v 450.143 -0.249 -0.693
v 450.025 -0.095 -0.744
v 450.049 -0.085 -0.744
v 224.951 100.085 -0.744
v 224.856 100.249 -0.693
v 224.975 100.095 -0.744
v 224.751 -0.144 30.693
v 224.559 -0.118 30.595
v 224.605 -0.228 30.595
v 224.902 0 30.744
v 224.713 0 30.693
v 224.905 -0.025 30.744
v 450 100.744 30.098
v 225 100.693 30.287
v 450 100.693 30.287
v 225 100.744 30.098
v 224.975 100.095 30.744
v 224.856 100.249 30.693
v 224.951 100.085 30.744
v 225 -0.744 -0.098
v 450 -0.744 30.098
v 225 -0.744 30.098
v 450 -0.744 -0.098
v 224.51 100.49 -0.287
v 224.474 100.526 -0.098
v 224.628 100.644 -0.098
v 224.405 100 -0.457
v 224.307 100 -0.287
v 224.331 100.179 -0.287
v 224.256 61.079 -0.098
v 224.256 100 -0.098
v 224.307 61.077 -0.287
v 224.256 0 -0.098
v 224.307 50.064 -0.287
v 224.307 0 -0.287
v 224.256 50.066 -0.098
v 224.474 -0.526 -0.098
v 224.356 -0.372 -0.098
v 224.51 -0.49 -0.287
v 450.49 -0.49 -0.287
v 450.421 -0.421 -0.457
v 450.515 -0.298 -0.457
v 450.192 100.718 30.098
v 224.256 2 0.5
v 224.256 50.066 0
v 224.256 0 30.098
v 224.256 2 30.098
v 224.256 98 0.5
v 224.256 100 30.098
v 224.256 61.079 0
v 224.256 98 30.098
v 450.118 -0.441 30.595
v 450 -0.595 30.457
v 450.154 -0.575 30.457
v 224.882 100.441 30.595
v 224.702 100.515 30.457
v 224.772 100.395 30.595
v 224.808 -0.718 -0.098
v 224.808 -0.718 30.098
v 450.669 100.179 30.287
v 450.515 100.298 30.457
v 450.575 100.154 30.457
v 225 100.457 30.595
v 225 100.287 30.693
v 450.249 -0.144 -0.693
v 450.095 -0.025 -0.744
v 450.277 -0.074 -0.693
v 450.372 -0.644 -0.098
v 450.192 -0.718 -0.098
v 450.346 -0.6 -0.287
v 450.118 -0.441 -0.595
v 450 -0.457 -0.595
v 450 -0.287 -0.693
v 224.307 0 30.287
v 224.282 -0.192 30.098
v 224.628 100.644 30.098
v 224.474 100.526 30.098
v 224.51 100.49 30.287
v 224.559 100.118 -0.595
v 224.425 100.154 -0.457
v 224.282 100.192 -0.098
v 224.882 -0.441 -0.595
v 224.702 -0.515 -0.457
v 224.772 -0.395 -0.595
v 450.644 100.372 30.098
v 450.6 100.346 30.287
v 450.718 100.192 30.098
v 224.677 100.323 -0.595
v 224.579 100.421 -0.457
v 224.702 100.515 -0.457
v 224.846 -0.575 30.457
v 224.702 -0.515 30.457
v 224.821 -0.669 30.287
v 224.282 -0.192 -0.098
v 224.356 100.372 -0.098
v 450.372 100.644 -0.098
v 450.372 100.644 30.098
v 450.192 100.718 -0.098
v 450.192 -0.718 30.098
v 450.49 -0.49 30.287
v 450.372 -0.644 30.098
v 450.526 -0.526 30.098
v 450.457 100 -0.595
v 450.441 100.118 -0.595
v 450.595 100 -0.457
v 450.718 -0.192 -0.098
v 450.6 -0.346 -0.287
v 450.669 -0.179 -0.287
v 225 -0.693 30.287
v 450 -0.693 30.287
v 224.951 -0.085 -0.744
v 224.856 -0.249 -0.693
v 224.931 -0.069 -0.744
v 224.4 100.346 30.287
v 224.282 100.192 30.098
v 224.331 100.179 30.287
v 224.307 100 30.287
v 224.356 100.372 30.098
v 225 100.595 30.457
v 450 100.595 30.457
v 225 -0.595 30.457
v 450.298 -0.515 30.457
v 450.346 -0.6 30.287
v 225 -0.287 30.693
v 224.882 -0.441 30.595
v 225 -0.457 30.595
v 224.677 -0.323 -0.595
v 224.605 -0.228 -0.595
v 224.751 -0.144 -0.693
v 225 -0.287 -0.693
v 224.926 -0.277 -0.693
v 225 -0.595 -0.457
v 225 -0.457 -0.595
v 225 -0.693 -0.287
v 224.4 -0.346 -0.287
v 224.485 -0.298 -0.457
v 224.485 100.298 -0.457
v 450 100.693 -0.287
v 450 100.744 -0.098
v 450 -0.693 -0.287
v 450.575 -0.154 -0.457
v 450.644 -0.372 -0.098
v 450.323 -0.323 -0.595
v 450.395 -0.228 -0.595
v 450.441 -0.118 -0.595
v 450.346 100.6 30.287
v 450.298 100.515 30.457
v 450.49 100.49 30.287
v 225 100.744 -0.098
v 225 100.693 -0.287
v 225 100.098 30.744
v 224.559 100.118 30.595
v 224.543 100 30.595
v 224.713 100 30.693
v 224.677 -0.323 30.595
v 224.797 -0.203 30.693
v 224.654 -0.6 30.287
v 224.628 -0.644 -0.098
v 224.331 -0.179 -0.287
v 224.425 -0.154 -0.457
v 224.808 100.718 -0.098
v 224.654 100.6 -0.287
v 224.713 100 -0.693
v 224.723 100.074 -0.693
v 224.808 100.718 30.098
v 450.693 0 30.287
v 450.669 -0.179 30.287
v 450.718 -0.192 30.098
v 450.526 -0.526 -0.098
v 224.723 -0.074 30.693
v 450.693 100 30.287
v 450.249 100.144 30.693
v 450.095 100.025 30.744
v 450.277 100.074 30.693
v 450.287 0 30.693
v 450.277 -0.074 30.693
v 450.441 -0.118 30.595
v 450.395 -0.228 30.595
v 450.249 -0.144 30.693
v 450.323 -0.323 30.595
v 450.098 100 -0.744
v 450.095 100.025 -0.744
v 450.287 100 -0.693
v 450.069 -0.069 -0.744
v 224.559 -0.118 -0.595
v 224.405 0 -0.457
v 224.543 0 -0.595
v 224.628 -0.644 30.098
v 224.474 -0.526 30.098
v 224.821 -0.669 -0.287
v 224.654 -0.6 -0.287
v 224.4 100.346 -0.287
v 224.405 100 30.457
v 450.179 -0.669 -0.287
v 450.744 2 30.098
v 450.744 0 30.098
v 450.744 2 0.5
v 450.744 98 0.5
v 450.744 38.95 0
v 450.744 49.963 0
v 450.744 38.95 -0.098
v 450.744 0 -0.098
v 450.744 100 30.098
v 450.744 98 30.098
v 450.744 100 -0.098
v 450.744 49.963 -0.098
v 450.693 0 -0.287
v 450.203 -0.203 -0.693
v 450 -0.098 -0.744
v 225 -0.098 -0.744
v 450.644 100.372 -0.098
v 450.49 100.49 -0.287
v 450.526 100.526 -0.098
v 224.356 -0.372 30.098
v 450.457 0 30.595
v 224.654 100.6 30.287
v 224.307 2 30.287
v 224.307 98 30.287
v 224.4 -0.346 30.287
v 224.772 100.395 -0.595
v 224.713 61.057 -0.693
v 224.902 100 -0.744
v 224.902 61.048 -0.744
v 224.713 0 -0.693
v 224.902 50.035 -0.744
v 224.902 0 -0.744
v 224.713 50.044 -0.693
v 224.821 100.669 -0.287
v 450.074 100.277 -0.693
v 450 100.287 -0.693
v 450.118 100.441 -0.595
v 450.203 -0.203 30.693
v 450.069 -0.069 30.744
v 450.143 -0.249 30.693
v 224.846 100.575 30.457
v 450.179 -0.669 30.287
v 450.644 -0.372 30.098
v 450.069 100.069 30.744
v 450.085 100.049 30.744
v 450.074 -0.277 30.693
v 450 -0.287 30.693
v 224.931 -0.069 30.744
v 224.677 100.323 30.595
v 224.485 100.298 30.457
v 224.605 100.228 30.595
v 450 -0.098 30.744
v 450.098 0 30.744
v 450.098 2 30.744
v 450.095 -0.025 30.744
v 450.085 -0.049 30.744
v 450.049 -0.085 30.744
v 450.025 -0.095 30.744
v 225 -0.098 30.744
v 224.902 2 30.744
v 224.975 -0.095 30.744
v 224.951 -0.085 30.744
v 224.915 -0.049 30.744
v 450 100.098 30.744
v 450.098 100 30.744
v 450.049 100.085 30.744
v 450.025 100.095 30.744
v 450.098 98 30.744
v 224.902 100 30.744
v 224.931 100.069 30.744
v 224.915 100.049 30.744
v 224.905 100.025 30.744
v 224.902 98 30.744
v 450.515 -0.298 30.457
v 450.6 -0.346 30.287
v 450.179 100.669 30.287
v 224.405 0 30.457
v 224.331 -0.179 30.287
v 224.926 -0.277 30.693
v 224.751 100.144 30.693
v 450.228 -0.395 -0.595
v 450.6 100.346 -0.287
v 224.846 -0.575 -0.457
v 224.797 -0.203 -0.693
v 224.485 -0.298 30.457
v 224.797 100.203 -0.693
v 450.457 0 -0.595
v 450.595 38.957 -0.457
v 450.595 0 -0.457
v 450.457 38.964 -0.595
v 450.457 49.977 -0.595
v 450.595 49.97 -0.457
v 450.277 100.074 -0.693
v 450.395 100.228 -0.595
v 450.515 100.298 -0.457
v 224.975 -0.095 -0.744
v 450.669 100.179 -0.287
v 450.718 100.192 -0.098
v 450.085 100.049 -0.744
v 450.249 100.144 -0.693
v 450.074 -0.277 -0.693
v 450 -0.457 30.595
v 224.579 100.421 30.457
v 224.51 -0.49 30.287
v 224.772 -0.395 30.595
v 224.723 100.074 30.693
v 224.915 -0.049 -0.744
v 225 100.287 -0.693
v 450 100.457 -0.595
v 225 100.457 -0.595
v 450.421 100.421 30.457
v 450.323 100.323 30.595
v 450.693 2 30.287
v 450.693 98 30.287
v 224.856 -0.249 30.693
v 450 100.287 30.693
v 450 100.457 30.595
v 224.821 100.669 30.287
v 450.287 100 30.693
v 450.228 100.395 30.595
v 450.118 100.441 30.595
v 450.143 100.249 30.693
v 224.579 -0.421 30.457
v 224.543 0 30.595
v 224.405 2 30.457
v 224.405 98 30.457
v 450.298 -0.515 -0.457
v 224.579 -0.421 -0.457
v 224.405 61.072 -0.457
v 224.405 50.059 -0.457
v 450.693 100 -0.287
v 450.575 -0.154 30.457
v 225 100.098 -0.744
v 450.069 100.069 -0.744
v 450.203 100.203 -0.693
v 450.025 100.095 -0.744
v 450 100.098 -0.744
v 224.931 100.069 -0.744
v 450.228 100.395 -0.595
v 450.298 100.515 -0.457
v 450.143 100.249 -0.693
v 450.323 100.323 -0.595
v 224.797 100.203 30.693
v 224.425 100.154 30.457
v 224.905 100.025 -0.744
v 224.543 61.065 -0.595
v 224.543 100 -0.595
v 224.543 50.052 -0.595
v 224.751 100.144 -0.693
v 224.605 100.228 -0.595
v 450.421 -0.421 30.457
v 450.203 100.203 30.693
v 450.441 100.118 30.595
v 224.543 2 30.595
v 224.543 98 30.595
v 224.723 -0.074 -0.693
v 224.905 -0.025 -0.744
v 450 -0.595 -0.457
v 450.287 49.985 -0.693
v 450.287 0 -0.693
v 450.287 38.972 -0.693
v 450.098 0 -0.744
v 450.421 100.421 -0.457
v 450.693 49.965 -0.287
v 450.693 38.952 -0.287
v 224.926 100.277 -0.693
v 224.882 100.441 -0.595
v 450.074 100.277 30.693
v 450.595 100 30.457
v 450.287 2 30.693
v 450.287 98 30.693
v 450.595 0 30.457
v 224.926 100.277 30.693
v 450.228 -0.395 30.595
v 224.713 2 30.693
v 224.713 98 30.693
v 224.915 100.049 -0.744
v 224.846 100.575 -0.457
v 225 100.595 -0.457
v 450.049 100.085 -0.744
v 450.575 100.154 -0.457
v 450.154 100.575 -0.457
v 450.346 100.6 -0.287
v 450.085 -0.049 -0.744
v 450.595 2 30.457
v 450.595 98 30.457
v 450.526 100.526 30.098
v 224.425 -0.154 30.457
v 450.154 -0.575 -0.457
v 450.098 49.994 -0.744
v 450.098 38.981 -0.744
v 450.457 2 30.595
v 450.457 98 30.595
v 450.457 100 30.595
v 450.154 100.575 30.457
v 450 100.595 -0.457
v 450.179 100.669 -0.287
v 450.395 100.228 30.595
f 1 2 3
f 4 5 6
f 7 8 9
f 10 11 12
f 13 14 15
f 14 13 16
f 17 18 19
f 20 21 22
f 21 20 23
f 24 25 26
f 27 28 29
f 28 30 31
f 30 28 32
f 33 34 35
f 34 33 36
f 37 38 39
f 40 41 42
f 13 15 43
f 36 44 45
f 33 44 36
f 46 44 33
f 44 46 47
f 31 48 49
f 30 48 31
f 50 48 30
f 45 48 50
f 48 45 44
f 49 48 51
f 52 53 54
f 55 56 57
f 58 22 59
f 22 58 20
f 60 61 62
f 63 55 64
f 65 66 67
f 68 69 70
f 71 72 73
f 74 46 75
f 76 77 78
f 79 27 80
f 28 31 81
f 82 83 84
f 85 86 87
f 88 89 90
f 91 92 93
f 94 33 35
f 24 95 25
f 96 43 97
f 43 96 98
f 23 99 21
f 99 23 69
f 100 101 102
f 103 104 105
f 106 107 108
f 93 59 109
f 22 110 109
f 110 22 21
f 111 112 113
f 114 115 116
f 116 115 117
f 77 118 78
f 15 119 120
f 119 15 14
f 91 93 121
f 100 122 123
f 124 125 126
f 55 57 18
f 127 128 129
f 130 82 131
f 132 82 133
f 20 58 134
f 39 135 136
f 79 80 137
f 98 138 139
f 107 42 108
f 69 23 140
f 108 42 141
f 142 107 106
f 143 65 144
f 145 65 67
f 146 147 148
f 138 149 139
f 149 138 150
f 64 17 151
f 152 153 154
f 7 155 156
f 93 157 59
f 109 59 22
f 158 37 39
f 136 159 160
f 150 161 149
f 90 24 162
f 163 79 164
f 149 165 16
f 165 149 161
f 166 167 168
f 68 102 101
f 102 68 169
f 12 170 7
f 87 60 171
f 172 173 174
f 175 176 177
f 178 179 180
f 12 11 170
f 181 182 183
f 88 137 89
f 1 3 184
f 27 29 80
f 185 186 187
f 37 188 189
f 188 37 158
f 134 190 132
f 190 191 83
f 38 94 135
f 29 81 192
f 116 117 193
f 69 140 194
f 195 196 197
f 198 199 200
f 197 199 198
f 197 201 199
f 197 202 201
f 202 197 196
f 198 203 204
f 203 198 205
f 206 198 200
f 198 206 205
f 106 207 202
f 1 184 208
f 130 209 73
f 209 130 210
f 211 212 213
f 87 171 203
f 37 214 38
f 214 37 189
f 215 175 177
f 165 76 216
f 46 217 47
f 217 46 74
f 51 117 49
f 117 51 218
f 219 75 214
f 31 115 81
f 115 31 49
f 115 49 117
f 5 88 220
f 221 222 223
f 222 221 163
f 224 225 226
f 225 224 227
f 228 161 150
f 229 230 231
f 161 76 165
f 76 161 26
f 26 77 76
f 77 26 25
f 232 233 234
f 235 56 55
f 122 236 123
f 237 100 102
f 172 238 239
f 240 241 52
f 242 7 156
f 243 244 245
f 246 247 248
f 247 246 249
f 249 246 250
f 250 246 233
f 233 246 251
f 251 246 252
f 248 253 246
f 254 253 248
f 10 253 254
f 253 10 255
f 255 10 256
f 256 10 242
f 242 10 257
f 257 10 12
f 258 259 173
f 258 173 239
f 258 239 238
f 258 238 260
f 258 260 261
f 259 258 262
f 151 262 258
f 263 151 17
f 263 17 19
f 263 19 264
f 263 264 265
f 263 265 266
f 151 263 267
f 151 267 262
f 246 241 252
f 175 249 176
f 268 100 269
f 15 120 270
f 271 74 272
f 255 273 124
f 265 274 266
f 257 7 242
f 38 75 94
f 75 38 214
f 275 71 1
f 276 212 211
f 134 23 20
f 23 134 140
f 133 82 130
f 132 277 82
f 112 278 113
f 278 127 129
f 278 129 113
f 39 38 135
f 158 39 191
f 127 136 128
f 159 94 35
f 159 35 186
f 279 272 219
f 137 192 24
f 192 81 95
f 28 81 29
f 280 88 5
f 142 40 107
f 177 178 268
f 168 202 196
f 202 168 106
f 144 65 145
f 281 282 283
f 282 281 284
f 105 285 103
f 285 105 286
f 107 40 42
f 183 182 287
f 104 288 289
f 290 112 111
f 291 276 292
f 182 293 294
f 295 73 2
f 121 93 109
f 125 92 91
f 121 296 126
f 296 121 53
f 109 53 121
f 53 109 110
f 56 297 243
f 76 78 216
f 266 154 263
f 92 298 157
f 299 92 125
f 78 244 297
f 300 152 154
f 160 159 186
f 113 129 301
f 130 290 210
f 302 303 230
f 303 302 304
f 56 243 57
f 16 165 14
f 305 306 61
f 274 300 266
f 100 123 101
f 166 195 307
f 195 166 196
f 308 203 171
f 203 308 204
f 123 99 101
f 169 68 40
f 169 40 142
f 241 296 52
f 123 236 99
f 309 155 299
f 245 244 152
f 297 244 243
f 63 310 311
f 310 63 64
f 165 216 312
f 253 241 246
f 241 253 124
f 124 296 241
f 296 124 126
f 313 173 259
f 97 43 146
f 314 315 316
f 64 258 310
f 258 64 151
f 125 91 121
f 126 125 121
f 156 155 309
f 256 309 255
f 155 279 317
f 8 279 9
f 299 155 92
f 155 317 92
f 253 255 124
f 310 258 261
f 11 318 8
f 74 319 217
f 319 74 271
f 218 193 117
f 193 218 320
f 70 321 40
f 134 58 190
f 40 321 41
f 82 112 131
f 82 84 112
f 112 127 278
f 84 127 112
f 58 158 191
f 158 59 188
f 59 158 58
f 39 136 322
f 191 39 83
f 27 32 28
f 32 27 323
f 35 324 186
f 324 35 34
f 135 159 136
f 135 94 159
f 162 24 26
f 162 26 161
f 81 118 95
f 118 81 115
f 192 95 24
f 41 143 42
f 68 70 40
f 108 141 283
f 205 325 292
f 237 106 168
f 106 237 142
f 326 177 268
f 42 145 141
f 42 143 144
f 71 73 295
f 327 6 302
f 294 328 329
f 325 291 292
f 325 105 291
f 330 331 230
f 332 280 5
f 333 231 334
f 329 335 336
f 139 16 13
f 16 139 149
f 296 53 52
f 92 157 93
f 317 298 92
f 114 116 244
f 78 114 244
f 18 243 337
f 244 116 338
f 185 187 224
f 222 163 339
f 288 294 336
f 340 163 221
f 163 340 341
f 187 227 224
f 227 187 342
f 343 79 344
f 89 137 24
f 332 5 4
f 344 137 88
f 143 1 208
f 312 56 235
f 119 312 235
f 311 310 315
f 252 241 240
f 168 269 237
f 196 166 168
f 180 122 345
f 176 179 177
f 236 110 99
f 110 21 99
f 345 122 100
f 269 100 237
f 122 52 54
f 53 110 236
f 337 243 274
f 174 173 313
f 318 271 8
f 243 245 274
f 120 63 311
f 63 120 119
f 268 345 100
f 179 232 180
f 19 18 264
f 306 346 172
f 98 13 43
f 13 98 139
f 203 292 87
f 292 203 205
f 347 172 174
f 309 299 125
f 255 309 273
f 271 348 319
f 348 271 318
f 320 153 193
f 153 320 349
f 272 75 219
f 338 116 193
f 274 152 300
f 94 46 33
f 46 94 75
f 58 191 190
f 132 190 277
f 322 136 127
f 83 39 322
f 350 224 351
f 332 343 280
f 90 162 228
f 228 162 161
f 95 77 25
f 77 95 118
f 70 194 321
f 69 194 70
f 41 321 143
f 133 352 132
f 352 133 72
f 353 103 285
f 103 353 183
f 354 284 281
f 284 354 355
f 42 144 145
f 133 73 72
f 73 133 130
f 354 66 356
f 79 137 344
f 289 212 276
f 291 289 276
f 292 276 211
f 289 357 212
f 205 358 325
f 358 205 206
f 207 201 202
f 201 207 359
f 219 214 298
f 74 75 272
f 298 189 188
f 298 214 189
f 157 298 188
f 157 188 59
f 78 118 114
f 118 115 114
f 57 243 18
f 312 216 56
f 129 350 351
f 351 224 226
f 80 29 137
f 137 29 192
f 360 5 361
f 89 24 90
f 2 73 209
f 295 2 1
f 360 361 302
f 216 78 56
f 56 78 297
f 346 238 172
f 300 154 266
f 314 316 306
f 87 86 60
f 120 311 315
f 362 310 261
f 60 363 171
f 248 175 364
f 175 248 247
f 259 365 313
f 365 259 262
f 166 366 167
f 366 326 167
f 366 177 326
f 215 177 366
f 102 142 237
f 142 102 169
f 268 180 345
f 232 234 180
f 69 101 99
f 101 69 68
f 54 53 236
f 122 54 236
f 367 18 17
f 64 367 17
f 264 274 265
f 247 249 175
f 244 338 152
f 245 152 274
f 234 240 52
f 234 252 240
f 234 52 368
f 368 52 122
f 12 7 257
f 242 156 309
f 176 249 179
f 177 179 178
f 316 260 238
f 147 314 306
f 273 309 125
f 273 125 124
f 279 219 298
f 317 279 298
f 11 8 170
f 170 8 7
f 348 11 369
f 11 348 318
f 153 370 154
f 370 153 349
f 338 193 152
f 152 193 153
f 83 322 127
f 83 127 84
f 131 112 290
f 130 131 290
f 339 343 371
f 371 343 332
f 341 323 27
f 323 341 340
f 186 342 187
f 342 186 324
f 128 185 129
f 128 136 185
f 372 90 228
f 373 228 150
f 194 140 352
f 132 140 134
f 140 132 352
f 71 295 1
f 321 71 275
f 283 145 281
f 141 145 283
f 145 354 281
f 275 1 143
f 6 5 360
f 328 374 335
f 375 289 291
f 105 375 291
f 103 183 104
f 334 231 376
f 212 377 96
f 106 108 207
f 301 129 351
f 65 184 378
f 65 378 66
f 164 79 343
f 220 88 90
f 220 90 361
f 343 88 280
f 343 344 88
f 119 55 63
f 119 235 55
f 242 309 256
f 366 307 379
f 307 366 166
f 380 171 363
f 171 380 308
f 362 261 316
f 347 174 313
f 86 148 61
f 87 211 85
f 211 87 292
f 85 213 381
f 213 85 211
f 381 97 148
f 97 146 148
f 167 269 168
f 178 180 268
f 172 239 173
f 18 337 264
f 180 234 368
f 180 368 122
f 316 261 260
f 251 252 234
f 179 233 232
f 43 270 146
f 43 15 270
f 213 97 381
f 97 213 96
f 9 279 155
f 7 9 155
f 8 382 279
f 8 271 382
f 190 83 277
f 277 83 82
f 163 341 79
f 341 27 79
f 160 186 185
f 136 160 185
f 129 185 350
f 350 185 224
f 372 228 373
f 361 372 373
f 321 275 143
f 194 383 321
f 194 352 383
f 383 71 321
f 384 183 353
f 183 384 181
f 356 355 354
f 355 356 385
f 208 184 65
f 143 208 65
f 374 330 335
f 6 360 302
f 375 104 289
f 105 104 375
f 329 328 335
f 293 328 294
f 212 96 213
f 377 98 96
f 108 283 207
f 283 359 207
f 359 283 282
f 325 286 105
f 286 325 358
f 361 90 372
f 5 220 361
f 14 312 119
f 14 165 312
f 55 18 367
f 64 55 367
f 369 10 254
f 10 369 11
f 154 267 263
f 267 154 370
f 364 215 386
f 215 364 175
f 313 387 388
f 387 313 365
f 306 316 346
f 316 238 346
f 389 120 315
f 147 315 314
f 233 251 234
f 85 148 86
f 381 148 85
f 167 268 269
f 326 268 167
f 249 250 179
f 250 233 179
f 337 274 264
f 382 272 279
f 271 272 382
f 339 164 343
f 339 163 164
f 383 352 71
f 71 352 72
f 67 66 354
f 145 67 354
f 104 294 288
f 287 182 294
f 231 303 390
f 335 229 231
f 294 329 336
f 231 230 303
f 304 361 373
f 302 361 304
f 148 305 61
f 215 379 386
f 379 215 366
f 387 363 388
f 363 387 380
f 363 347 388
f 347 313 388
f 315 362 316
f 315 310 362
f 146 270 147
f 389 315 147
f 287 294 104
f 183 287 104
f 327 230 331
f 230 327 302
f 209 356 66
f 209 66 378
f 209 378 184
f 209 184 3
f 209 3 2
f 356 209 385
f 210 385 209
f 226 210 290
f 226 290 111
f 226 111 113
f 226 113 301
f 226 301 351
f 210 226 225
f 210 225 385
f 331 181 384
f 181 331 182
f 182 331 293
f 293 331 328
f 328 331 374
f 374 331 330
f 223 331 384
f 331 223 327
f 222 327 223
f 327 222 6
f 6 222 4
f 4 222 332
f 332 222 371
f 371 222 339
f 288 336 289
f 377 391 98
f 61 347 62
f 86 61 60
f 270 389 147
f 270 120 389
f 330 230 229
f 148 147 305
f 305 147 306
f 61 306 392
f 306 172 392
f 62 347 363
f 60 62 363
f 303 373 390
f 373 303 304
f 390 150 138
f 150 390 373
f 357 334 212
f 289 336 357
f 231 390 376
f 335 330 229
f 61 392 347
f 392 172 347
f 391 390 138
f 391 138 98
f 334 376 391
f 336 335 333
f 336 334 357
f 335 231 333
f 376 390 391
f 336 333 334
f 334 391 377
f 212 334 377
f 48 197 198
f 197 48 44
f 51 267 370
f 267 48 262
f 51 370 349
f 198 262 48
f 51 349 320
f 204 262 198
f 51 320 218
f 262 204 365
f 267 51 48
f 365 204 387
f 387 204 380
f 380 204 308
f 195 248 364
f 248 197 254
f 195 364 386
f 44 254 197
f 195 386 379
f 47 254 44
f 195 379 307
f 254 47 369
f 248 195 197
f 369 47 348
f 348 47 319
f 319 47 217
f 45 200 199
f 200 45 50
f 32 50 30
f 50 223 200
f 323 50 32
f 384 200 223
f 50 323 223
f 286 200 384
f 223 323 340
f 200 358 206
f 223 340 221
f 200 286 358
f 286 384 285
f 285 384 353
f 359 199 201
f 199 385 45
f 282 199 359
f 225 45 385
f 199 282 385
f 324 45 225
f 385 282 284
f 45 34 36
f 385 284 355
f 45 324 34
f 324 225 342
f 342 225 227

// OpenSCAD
*cube([670,70,50]);//all
a=225;
b=100;
c=30;
w=11;
k=1000/60;    
ang=2.81;
kc=k*cos(ang);
ks=k*sin(ang);
bore=5.5;
//color("red")
module pong(){
difference(){
    minkowski(){
    cube([a,b,c]);
        sphere($fn=24,d=1.5);
        }
    translate([2.1,2,0.5])
    cube([a+4,b-4,c+5]);
    translate([15,15,-1.1])cylinder(h=15,d=bore,$fn=50);
    translate([15,b-15,-1.1])cylinder(h=15,d=bore,$fn=50);
    color("teal")rotate(-ang)
        translate([-5.1,(b/2)+(w),-1.5])cube([a+5,w,1.5]);
        color("blue")translate([35,w/4,-1.5])cube([90,3.25*w,1.5]);
        translate([a,-1,-1])cube([a+5,b+5,c+5]);
        translate([k/4,(b/2)+1.5*w,-1.1])cylinder(h=15,d=bore,$fn=50);
        translate([-5,(b/2),c/2])rotate(90,[0,1,0])cylinder(h=15,d=2*bore,$fn=50);
        translate([38,3*w,-1.1])cylinder(h=15,d=bore,$fn=50);
        /*
    for (i=[0:14]){
    translate([k/2+i*kc,(b/2)-i*ks+1.5*w,-1.1])cylinder(h=15,d=bore,$fn=50);
        echo(i*ks,i*kc);
    }
    
    for (i=[1:5]){
        translate([30+i*k,w-w/4,-1.1])cylinder(h=15,d=bore,$fn=50);
        translate([30+i*k,2*w-w/4,-1.1])cylinder(h=15,d=bore,$fn=50);
        translate([30+i*k,3*w-w/4,-1.1])cylinder(h=15,d=bore,$fn=50);
    }
        */
}
}

//*
//rotate(-ang)color("teal")translate([-1.1,(b/2)+(w),-3.1])cube([a*3,w,2.5]);
difference(){
color("pink")translate([a,0,0])
    minkowski(){
    cube([a,b,c]);
        sphere($fn=24,d=1.5);
        }    
        translate([a-6,2,0.5])cube([a+20,b-4,c+5]);
        rotate(-ang)color("teal")translate([-1.1,(b/2)+(w),-1.5])cube([a*3,w,1.5]);
        //for (i=[13:28]){color("red")translate([k/2+i*kc,(b/2)-i*ks+1.5*w,-1.1])cylinder(h=15,d=bore,$fn=50); }
}



//  */ 
*pong();
*translate([3*a,b,0])rotate(180)pong();
